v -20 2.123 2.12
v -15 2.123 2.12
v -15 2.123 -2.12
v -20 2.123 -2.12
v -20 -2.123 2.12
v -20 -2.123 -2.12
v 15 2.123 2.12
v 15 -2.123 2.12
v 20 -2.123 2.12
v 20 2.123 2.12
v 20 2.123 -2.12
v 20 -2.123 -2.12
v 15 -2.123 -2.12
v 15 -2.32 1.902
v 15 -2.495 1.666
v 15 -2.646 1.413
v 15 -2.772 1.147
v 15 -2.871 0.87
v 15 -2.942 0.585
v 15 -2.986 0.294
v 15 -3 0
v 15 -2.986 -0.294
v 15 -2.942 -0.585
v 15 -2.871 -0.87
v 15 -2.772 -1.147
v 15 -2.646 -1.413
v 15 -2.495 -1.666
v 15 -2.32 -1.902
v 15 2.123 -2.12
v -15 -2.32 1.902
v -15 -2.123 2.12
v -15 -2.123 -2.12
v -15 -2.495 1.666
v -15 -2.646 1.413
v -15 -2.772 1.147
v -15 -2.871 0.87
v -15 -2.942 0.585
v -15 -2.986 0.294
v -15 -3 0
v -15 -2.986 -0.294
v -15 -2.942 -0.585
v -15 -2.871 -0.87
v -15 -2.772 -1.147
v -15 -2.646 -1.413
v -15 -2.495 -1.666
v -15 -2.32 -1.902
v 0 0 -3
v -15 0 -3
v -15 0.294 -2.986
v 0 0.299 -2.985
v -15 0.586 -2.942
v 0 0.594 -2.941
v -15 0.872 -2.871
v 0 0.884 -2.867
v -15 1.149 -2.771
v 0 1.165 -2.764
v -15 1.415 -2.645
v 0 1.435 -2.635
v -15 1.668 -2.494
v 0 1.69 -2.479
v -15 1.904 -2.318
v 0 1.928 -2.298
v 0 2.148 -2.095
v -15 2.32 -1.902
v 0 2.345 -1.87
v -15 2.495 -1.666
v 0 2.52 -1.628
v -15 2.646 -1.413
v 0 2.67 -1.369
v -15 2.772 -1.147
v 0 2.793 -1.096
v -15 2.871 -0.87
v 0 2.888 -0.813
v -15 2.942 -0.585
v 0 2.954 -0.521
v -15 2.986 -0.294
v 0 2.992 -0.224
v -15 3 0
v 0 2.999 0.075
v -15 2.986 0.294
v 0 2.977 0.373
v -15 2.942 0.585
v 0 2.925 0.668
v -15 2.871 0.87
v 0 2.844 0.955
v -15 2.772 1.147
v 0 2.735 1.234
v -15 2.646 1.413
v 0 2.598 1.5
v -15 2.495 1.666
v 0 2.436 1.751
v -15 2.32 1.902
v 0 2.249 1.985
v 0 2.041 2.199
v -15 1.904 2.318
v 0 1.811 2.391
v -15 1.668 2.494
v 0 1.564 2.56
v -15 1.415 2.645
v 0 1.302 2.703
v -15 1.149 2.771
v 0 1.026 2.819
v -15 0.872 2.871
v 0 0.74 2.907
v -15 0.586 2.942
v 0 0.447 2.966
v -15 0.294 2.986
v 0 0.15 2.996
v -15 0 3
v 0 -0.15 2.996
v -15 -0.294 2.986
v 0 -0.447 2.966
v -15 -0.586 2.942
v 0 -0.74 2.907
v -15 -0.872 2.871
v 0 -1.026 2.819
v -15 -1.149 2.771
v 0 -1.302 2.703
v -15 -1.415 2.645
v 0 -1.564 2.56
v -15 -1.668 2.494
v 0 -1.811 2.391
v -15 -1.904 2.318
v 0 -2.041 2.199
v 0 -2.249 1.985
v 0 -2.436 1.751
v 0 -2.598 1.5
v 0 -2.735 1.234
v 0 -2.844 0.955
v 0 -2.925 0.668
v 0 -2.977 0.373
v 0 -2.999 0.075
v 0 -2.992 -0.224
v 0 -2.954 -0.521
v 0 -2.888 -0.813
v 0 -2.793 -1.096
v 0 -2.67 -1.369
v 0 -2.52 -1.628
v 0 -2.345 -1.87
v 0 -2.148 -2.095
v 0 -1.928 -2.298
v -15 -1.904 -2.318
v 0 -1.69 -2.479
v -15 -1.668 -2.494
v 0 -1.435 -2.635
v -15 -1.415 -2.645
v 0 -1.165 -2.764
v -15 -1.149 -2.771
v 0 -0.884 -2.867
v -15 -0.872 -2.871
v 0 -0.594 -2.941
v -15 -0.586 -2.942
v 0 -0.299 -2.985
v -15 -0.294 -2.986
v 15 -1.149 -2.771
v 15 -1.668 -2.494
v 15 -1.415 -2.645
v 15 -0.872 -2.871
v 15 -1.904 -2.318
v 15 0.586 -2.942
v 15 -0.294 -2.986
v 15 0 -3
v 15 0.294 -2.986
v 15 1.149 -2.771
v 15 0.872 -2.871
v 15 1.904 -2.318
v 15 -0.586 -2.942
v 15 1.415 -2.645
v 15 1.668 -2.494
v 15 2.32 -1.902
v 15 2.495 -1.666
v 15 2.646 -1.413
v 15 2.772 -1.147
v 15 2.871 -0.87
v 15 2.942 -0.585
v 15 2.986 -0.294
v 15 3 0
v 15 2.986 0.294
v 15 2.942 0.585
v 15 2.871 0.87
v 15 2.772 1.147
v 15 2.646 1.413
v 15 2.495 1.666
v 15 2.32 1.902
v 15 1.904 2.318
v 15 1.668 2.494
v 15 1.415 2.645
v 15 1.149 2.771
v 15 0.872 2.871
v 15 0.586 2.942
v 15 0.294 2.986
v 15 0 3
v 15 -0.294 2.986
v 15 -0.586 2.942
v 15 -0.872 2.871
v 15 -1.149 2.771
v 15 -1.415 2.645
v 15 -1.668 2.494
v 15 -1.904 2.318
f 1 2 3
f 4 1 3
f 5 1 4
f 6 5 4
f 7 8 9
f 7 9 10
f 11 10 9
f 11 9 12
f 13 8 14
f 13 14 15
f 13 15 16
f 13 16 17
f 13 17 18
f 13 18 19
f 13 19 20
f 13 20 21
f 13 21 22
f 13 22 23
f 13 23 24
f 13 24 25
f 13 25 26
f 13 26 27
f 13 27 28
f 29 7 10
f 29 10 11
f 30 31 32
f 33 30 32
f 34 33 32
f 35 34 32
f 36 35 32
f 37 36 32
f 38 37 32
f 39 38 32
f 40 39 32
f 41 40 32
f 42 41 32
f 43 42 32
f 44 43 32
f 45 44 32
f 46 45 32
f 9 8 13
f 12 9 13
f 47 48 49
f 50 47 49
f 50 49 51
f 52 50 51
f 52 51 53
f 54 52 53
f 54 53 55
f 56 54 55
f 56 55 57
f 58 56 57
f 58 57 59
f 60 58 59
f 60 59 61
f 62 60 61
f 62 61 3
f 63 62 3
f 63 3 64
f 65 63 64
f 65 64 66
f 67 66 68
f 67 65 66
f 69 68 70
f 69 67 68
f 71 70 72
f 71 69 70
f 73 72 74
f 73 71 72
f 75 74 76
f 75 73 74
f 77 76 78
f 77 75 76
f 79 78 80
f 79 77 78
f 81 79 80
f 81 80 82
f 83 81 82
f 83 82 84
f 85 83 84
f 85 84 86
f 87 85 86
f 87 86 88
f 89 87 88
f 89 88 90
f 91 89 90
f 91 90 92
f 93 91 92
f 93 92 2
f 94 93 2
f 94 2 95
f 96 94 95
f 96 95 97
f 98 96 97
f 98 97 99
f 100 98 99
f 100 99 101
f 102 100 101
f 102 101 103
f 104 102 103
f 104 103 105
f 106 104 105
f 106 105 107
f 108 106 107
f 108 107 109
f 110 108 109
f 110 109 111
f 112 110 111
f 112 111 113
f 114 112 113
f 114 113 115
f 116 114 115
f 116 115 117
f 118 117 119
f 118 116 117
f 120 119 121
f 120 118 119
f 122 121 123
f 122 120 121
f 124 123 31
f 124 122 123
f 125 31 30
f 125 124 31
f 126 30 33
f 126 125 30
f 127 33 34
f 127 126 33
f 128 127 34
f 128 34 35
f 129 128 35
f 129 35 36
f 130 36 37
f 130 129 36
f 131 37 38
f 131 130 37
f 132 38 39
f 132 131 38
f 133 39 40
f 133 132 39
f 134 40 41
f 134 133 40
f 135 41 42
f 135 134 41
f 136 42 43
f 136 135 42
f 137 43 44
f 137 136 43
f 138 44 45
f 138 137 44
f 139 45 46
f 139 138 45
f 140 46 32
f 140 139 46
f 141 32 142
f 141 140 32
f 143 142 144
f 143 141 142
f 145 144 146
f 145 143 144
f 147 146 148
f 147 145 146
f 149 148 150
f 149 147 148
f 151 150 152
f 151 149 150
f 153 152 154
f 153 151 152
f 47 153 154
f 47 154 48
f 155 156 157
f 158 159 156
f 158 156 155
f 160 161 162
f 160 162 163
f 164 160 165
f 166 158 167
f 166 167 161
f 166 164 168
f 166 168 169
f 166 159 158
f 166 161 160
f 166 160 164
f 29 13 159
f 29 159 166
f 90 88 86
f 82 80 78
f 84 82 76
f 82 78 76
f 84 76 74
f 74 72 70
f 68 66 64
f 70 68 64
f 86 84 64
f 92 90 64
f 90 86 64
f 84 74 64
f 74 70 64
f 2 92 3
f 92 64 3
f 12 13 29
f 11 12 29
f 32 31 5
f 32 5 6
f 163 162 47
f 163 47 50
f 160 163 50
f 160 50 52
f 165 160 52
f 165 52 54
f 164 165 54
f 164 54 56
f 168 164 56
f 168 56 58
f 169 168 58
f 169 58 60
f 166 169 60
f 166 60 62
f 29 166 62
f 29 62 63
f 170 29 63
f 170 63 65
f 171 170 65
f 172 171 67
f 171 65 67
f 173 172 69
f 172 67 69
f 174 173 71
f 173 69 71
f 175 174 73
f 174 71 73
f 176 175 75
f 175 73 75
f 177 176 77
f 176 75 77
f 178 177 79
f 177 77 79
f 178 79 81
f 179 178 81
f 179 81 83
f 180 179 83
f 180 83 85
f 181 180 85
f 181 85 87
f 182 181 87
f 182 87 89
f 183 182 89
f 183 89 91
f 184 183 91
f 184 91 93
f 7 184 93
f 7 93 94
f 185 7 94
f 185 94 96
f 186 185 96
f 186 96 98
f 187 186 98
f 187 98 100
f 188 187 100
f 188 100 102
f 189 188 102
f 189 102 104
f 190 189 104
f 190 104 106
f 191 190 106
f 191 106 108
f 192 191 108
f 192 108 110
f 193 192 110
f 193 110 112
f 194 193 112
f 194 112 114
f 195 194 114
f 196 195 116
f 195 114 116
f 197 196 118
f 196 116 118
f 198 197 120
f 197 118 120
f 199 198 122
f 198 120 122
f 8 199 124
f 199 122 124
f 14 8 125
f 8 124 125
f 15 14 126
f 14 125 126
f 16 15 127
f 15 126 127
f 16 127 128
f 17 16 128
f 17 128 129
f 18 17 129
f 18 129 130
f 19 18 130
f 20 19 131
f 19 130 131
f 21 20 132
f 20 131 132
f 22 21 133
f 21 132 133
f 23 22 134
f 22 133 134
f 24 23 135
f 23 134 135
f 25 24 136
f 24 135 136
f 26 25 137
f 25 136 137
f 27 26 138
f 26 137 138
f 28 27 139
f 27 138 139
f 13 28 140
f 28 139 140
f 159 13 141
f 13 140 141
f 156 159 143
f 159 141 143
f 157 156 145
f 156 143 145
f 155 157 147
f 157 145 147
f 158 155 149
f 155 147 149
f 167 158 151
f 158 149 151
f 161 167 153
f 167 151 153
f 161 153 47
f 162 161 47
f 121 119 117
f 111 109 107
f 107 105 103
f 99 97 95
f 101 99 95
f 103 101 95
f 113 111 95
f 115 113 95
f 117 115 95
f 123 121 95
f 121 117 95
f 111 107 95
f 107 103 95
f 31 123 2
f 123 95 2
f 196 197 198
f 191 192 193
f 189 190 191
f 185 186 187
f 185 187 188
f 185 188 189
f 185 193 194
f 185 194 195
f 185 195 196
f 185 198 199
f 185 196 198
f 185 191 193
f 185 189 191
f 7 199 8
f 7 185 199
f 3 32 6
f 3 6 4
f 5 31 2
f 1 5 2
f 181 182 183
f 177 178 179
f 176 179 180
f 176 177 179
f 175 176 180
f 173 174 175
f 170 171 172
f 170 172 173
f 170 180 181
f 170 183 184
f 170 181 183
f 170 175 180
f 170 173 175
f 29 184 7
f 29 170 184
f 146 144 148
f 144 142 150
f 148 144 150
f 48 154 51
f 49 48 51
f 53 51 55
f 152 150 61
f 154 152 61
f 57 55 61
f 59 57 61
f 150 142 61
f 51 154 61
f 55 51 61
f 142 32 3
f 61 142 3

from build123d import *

# Parameters (mm, degrees)
SKETCH1_R           = 3
BOSS_EXTRUDE1_DEPTH = 15
SKETCH2_W           = 4.24
SKETCH2_H           = 4.245279732
BOSS_EXTRUDE2_DEPTH = 5


with BuildPart() as part:
    # Sketch1 → Boss-Extrude1 (new body)
    with BuildSketch(Plane(origin=(0, 0, 0), x_dir=(0, 0, -1), z_dir=(1, 0, 0))):
        Circle(SKETCH1_R)
    boss_extrude1 = extrude(amount=BOSS_EXTRUDE1_DEPTH)

    # Sketch2 → Boss-Extrude2 (add)
    with BuildSketch(Plane(origin=(15, 0, 0), x_dir=(0, 0, -1), z_dir=(1, 0, 0))):
        Rectangle(SKETCH2_W, SKETCH2_H)
    boss_extrude2 = extrude(amount=BOSS_EXTRUDE2_DEPTH)

    # Mirror1: Boss-Extrude1, Boss-Extrude2 across plane
    add(boss_extrude1.mirror(Plane(origin=(0, 0, 0), x_dir=(0, 0, 1), z_dir=(1, 0, 0))))
    add(boss_extrude2.mirror(Plane(origin=(0, 0, 0), x_dir=(0, 0, 1), z_dir=(1, 0, 0))))


solid = part.part
